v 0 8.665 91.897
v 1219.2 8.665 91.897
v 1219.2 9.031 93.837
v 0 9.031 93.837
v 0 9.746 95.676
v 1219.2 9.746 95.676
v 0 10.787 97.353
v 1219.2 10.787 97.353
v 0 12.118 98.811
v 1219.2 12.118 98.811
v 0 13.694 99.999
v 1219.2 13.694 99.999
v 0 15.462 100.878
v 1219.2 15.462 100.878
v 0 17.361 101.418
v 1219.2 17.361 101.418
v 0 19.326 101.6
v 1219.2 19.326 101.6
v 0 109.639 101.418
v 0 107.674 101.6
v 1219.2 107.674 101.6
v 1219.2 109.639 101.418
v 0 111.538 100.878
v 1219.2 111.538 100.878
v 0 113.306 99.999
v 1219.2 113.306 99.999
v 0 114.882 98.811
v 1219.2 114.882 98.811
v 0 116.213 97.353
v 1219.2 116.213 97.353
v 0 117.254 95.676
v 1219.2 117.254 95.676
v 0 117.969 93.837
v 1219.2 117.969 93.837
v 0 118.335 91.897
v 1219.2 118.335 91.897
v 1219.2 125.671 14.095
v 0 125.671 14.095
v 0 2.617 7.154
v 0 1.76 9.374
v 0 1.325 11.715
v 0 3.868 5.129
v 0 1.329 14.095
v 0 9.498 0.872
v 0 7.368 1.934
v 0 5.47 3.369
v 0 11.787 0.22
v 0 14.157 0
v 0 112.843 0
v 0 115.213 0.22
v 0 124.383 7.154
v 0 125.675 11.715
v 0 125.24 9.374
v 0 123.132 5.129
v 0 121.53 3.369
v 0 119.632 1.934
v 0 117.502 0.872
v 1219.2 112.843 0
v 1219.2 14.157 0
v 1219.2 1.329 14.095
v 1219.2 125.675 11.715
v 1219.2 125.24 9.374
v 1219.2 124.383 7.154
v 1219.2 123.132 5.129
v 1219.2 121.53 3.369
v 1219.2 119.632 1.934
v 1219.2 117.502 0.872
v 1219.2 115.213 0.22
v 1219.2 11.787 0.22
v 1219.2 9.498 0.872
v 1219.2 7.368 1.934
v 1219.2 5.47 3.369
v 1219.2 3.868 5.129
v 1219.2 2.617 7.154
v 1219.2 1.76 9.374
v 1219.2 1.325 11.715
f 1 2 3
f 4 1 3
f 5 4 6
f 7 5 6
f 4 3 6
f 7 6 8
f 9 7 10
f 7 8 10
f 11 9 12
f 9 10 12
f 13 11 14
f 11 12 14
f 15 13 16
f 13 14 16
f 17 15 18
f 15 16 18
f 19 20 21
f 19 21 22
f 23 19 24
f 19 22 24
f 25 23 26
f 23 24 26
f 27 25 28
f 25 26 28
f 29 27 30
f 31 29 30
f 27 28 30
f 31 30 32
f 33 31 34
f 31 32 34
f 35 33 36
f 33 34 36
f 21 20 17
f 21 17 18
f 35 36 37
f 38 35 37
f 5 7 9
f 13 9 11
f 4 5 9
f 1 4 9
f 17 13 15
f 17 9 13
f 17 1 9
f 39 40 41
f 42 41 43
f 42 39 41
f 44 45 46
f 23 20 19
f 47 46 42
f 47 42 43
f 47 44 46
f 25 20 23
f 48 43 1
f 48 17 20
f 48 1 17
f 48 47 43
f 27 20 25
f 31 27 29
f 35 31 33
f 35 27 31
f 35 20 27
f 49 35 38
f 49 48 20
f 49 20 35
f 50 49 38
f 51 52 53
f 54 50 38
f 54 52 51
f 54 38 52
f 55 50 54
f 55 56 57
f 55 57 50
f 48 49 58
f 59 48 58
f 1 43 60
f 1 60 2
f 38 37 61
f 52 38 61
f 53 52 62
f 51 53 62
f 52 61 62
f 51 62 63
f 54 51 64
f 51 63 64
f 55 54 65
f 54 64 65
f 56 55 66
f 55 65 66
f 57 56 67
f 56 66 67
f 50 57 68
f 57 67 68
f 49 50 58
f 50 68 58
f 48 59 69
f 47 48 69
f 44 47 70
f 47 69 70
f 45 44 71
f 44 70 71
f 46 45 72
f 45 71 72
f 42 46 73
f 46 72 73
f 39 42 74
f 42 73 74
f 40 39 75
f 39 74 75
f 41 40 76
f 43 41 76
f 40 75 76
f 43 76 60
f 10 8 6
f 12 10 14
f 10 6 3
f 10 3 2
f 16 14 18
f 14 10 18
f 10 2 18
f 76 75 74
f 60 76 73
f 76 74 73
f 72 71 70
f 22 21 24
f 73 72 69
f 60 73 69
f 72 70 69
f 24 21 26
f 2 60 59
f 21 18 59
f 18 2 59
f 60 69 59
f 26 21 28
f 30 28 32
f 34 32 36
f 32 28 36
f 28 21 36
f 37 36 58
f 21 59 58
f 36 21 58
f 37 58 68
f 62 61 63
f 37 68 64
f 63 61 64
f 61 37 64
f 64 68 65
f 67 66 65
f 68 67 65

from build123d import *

# Parameters (mm, degrees)
F0_W     = 1219.2
F0_H     = 127
F1_DEPTH = 101.6
F3_DEPTH = 1219.2


with BuildPart() as f1:
    # F0 (on Top) → F1 (new body)
    with BuildSketch(Plane.XY):
        with Locations((609.6, 63.5)):
            Rectangle(F0_W, F0_H)
    extrude(amount=F1_DEPTH)

    # F2 (on face) → F3 (cut, through all)
    with BuildSketch(Plane.YZ.offset(1219.2)):
        with BuildLine():
            Line((9.579805, 101.6), (0, 101.6))
            Line((0, 101.6), (0, 0))
            Line((0, 0), (7.050204, 0))
            Line((7.050204, 0), (14.157143, 0))
            ThreePointArc((14.157143, 0), (4.627971, 4.21213), (1.328974, 14.094627))
            Line((1.328974, 14.094627), (8.66489, 91.896731))
            ThreePointArc((8.66489, 91.896731), (12.118215, 98.810986), (19.326112, 101.6))
            Line((19.326112, 101.6), (9.579805, 101.6))
        make_face()
        with BuildLine():
            Line((117.420195, 101.6), (107.673888, 101.6))
            ThreePointArc((107.673888, 101.6), (114.881785, 98.810986), (118.33511, 91.896731))
            Line((118.33511, 91.896731), (125.671026, 14.094627))
            ThreePointArc((125.671026, 14.094627), (122.372029, 4.21213), (112.842857, 0))
            Line((112.842857, 0), (119.949796, 0))
            Line((119.949796, 0), (127, 0))
            Line((127, 0), (127, 101.6))
            Line((127, 101.6), (117.420195, 101.6))
        make_face()
    extrude(amount=-F3_DEPTH, mode=Mode.SUBTRACT)


solid = f1.part
